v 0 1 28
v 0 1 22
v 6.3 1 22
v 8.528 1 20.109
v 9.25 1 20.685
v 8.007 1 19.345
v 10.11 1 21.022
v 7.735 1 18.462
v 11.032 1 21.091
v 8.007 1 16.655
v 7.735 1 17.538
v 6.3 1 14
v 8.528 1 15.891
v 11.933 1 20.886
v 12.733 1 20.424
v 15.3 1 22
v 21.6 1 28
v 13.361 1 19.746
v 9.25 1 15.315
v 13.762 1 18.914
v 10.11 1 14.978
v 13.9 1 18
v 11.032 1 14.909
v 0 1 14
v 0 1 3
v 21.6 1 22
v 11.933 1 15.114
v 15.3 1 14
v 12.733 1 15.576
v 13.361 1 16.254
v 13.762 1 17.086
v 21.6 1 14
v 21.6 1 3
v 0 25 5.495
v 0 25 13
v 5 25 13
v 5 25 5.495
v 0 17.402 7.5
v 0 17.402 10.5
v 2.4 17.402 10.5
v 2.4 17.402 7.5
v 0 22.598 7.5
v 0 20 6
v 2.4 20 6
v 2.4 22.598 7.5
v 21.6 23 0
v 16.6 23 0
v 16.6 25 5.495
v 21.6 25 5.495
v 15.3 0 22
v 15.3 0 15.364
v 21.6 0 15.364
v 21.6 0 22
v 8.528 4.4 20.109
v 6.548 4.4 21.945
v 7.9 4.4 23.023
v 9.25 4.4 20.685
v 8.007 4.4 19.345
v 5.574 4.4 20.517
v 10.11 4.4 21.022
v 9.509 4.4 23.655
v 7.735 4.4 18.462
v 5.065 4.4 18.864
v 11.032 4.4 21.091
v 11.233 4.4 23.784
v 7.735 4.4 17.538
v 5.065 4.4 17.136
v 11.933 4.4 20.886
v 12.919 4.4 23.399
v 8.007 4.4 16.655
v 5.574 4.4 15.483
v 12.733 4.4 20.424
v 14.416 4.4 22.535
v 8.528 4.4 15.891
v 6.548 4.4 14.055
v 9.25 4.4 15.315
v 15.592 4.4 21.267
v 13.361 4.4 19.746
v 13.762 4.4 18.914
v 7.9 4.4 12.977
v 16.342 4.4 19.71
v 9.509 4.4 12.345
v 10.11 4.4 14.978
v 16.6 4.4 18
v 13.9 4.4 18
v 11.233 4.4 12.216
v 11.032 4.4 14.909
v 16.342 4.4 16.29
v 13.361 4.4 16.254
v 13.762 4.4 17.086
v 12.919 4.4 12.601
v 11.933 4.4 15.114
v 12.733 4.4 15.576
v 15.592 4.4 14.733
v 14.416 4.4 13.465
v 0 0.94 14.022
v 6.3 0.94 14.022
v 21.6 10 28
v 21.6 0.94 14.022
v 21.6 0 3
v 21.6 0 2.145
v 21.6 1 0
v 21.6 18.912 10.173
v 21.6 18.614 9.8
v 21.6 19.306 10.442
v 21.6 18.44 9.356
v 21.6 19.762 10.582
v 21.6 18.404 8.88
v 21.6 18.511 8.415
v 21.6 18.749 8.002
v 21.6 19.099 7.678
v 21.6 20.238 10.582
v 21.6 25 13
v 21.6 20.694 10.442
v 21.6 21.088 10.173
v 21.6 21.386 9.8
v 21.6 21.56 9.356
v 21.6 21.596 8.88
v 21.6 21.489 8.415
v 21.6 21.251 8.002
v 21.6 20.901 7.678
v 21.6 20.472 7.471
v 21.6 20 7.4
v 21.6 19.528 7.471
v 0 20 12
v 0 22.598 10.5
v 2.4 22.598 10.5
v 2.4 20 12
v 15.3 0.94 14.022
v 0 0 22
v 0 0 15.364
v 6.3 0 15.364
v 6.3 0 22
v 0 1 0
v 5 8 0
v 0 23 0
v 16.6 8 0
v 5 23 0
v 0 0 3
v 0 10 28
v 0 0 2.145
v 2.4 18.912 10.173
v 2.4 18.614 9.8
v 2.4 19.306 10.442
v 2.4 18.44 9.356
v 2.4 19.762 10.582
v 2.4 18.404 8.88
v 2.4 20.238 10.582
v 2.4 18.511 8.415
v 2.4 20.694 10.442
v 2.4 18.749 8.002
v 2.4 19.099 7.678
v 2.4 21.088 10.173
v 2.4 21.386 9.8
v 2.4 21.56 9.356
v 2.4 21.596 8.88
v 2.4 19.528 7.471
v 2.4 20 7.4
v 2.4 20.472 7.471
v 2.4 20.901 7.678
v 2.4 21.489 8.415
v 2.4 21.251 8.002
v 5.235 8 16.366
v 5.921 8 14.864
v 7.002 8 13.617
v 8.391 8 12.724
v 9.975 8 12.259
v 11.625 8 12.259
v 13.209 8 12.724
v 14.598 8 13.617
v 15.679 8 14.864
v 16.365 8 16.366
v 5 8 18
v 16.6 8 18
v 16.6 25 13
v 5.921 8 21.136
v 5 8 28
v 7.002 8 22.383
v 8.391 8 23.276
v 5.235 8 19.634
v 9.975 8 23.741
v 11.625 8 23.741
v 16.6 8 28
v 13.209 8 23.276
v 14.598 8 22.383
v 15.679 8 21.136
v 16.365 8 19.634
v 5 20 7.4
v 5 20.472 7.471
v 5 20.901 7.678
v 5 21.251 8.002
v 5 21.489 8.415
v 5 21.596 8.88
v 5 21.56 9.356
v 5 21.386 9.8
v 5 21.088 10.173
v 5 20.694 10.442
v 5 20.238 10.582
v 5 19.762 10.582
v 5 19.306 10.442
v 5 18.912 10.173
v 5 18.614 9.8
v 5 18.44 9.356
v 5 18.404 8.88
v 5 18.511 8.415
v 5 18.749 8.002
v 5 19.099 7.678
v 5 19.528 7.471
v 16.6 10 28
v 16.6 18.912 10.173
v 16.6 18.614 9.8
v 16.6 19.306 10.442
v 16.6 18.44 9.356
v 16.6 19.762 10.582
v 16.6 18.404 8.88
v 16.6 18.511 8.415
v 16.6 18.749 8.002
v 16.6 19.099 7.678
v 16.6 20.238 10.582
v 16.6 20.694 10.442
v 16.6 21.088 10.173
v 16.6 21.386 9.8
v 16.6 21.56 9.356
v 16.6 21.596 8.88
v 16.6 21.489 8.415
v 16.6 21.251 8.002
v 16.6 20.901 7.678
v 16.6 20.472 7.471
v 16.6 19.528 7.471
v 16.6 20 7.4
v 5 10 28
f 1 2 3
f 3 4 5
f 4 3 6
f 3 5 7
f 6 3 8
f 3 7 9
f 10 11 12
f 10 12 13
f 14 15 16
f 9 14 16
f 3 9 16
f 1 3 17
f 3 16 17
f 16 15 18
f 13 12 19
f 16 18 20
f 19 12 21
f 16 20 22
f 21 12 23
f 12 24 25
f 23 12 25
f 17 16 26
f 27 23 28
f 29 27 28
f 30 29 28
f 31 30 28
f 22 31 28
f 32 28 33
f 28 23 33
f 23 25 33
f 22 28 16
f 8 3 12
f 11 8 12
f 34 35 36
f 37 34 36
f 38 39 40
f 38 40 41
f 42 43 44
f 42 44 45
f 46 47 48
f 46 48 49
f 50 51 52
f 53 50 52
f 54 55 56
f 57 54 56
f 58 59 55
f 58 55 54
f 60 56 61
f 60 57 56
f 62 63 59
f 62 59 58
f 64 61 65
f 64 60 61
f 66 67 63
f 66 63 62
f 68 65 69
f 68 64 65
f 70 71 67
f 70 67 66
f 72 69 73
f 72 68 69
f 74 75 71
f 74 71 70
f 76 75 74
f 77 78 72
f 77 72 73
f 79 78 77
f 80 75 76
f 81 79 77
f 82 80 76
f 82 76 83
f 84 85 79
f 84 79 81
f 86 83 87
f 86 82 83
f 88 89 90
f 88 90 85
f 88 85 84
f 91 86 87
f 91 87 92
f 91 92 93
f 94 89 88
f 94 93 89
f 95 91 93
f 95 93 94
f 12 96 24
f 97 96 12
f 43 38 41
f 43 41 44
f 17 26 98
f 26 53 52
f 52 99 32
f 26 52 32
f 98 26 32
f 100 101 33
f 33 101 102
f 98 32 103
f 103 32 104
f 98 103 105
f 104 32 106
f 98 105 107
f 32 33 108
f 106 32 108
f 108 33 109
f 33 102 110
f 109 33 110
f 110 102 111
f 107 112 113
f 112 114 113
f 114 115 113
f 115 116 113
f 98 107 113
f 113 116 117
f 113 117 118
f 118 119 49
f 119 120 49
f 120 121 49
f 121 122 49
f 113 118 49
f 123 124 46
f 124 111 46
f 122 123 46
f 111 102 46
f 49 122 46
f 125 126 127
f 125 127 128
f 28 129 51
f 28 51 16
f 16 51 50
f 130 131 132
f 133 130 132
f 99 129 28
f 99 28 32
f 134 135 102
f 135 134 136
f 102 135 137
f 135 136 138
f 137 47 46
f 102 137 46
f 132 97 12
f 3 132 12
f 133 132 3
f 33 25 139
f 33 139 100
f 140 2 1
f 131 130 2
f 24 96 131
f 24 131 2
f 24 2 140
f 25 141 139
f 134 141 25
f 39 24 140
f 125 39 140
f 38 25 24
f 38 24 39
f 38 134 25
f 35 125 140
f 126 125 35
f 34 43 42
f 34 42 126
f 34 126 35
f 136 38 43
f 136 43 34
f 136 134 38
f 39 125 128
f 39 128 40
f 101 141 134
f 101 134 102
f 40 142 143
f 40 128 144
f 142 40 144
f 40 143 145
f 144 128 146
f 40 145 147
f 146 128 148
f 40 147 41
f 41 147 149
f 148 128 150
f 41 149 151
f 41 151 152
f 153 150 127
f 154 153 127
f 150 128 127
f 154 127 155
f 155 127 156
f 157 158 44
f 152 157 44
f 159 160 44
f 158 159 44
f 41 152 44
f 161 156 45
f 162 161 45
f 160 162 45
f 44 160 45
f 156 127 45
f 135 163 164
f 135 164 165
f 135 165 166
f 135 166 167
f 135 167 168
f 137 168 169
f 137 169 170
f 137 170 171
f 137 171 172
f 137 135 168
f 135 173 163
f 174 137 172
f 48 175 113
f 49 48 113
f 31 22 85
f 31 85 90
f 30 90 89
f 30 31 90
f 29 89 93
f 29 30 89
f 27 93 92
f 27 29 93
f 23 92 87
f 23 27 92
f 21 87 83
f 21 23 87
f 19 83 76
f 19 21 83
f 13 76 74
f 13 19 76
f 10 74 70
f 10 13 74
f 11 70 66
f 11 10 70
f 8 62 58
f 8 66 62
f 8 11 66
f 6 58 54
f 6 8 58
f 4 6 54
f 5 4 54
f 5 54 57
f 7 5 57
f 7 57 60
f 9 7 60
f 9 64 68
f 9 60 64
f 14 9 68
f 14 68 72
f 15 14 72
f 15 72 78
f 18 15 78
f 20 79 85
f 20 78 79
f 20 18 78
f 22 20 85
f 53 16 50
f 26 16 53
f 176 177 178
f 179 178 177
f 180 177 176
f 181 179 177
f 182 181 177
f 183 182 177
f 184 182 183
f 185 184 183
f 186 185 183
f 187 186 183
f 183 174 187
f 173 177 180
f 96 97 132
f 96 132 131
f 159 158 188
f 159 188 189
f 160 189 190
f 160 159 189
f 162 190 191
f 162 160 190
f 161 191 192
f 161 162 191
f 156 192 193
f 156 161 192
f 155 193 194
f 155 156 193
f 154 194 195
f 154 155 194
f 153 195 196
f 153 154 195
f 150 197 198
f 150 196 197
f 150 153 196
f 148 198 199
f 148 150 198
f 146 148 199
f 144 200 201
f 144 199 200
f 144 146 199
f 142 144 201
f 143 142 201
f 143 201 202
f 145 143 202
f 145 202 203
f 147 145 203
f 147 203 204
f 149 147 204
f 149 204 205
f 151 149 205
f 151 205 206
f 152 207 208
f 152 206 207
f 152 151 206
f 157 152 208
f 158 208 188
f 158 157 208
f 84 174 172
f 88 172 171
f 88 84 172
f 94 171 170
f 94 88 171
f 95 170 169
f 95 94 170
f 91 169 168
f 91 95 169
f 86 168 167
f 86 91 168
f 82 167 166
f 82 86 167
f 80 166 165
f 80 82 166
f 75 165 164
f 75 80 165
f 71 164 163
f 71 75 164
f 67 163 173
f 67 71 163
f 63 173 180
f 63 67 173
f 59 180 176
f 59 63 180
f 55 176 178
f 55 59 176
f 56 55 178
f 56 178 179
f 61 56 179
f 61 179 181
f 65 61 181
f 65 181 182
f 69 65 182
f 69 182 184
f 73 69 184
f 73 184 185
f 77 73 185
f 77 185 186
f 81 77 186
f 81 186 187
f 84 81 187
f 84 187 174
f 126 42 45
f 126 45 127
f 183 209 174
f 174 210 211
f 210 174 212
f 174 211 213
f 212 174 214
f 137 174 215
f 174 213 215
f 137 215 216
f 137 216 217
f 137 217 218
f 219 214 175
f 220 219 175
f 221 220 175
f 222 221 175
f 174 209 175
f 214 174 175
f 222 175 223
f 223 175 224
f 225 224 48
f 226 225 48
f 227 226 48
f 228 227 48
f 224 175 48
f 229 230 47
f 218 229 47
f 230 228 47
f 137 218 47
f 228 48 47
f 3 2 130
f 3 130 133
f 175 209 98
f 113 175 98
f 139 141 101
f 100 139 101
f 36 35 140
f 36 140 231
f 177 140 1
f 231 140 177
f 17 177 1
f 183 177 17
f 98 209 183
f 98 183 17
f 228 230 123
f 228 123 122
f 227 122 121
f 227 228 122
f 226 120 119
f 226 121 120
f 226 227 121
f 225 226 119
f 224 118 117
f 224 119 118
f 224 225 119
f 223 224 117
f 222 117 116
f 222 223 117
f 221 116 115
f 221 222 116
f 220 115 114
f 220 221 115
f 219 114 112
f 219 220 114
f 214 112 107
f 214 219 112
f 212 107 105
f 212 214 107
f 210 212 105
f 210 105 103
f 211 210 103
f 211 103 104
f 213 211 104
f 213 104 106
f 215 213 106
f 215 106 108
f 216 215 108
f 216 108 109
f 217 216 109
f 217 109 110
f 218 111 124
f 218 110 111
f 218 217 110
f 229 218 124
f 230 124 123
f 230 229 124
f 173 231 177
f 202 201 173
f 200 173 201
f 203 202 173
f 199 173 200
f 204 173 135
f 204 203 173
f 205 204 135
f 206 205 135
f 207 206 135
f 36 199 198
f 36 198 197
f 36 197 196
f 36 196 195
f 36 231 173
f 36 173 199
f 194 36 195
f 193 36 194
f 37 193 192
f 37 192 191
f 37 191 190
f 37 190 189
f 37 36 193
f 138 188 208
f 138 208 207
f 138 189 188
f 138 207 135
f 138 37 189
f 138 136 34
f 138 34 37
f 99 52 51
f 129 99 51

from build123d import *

# Parameters (mm, degrees)
CYLINDER_R              = 1.6
CYLINDER_DEPTH          = 22.6
CYLINDER001_R           = 3.1
CYLINDER001_DEPTH       = 25
CYLINDER002_R           = 5.8
CYLINDER002_DEPTH       = 25
CUBE002_W               = 22.6
CUBE002_H               = 1.1
CUBE002_DEPTH           = 11
CUBE003_W               = 22.6
CUBE003_H               = 1.1
CUBE003_DEPTH           = 11
CUBE004_W               = 30
CUBE004_H               = 3
CUBE004_DEPTH           = 8
CUBE004_PLACEMENT_ANGLE = 160
PRISM_DEPTH             = 2.5
CUBE005_W               = 22.6
CUBE005_H               = 6
CUBE005_DEPTH           = 6
CUBE005_PLACEMENT_ANGLE = 115
CUBE006_W               = 22.6
CUBE006_H               = 27
CUBE006_DEPTH           = 28
CUBE006_PLACEMENT_ANGLE = 45
CUBE007_W               = 22.6
CUBE007_H               = 10
CUBE007_DEPTH           = 10
CUBE007_PLACEMENT_ANGLE = 20
CYLINDER003_R           = 11
CYLINDER003_DEPTH       = 11.6
CUBE001_W               = 11.6
CUBE001_H               = 25
CUBE001_DEPTH           = 29
CUBE_W                  = 21.6
CUBE_H                  = 25
CUBE_DEPTH              = 28
SKETCH_W                = 9
SKETCH_H                = 8
POCKET_DEPTH            = 1
CHAMFER_SIZE            = 1


with BuildPart() as cylinder:
    # cylinder → cylinder (new body)
    with BuildSketch(Plane(origin=(-0.1, 20, 9), x_dir=(0, 0, -1), z_dir=(1, 0, 0))):
        Circle(CYLINDER_R)
    extrude(amount=CYLINDER_DEPTH)


with BuildPart() as cylinder001:
    # cylinder001 → cylinder001 (new body)
    with BuildSketch(Plane(origin=(10.8, -0.1, 18), x_dir=(1, 0, 0), z_dir=(0, 1, 0))):
        Circle(CYLINDER001_R)
    extrude(amount=CYLINDER001_DEPTH)


with BuildPart() as cylinder002:
    # cylinder002 → cylinder002 (new body)
    with BuildSketch(Plane(origin=(10.8, 4.4, 18), x_dir=(1, 0, 0), z_dir=(0, 1, 0))):
        Circle(CYLINDER002_R)
    extrude(amount=CYLINDER002_DEPTH)


with BuildPart() as cube002:
    # cube002 → cube002 (new body)
    with BuildSketch(Plane(origin=(-0.1, -0.1, 3), x_dir=(1, 0, 0), z_dir=(0, 0, 1))):
        with Locations((11.3, 0.55)):
            Rectangle(CUBE002_W, CUBE002_H)
    extrude(amount=CUBE002_DEPTH)


with BuildPart() as cube003:
    # cube003 → cube003 (new body)
    with BuildSketch(Plane(origin=(-0.1, -0.1, 22), x_dir=(1, 0, 0), z_dir=(0, 0, 1))):
        with Locations((11.3, 0.55)):
            Rectangle(CUBE003_W, CUBE003_H)
    extrude(amount=CUBE003_DEPTH)


with BuildPart() as cube004:
    # cube004 → cube004 (new body)
    with BuildSketch(Plane.XY):
        with Locations((15, 1.5)):
            Rectangle(CUBE004_W, CUBE004_H)
    extrude(amount=CUBE004_DEPTH)


with BuildPart() as cube004_1:
    # cube004 placement: moved
    add(cube004.part.moved(Location((-0.1, 1, 14))).rotate(Axis((-0.1, 1, 14), (1, 0, 0)), CUBE004_PLACEMENT_ANGLE))


with BuildPart() as prism:
    # prism → prism (new body)
    with BuildSketch(Plane(origin=(-0.1, 20, 9), x_dir=(0, 0, -1), z_dir=(1, 0, 0))):
        Polygon((3, 0), (1.5, 2.598076), (-1.5, 2.598076), (-3, 0), (-1.5, -2.598076), (1.5, -2.598076), align=None)
    extrude(amount=PRISM_DEPTH)


with BuildPart() as cube005:
    # cube005 → cube005 (new body)
    with BuildSketch(Plane.XY):
        with Locations((11.3, 3)):
            Rectangle(CUBE005_W, CUBE005_H)
    extrude(amount=CUBE005_DEPTH)


with BuildPart() as cube005_1:
    # cube005 placement: moved
    add(cube005.part.moved(Location((-0.1, 1, 0))).rotate(Axis((-0.1, 1, 0), (1, 0, 0)), CUBE005_PLACEMENT_ANGLE))


with BuildPart() as cube006:
    # cube006 → cube006 (new body)
    with BuildSketch(Plane.XY):
        with Locations((11.3, 13.5)):
            Rectangle(CUBE006_W, CUBE006_H)
    extrude(amount=CUBE006_DEPTH)


with BuildPart() as cube006_1:
    # cube006 placement: moved
    add(cube006.part.moved(Location((-0.1, 25, 13))).rotate(Axis((-0.1, 25, 13), (1, 0, 0)), CUBE006_PLACEMENT_ANGLE))


with BuildPart() as cube007:
    # cube007 → cube007 (new body)
    with BuildSketch(Plane.XY):
        with Locations((11.3, 5)):
            Rectangle(CUBE007_W, CUBE007_H)
    extrude(amount=CUBE007_DEPTH)


with BuildPart() as cube007_1:
    # cube007 placement: moved
    add(cube007.part.moved(Location((-0.1, 23, 0))).rotate(Axis((-0.1, 23, 0), (-1, 0, 0)), CUBE007_PLACEMENT_ANGLE))


with BuildPart() as cylinder003:
    # cylinder003 → cylinder003 (new body)
    with BuildSketch(Plane(origin=(5, 20, 9), x_dir=(0, 0, -1), z_dir=(1, 0, 0))):
        Circle(CYLINDER003_R)
    extrude(amount=CYLINDER003_DEPTH)


with BuildPart() as group:
    # cube001 → cube001 (new body)
    with BuildSketch(Plane(origin=(5, 8, -0.1), x_dir=(1, 0, 0), z_dir=(0, 0, 1))):
        with Locations((5.8, 12.5)):
            Rectangle(CUBE001_W, CUBE001_H)
    extrude(amount=CUBE001_DEPTH)

    # Group: union cylinder, cylinder001, cylinder002, cube002, cube003, cube004, prism, cube005, cube006, cube007, cylinder003
    add(cylinder.part)
    add(cylinder001.part)
    add(cylinder002.part)
    add(cube002.part)
    add(cube003.part)
    add(cube004_1.part)
    add(prism.part)
    add(cube005_1.part)
    add(cube006_1.part)
    add(cube007_1.part)
    add(cylinder003.part)


with BuildPart() as body:
    # cube → cube (new body)
    with BuildSketch(Plane.XY):
        with Locations((10.8, 12.5)):
            Rectangle(CUBE_W, CUBE_H)
    extrude(amount=CUBE_DEPTH)

    # difference: cut Group
    add(group.part, mode=Mode.SUBTRACT)

    # Sketch (on Face6 of BaseFeature) → Pocket (cut)
    with BuildSketch(Plane.XZ):
        with Locations((10.8, 18)):
            Rectangle(SKETCH_W, SKETCH_H)
    extrude(amount=-POCKET_DEPTH, mode=Mode.SUBTRACT)

    # Chamfer
    chamfer_edges = [body.edges().sort_by_distance(p)[0] for p in [
        (18.45, 0, 14.36397),
        (3.15, 0, 14.36397),
    ]]
    chamfer(chamfer_edges, length=CHAMFER_SIZE)


solid = body.part
